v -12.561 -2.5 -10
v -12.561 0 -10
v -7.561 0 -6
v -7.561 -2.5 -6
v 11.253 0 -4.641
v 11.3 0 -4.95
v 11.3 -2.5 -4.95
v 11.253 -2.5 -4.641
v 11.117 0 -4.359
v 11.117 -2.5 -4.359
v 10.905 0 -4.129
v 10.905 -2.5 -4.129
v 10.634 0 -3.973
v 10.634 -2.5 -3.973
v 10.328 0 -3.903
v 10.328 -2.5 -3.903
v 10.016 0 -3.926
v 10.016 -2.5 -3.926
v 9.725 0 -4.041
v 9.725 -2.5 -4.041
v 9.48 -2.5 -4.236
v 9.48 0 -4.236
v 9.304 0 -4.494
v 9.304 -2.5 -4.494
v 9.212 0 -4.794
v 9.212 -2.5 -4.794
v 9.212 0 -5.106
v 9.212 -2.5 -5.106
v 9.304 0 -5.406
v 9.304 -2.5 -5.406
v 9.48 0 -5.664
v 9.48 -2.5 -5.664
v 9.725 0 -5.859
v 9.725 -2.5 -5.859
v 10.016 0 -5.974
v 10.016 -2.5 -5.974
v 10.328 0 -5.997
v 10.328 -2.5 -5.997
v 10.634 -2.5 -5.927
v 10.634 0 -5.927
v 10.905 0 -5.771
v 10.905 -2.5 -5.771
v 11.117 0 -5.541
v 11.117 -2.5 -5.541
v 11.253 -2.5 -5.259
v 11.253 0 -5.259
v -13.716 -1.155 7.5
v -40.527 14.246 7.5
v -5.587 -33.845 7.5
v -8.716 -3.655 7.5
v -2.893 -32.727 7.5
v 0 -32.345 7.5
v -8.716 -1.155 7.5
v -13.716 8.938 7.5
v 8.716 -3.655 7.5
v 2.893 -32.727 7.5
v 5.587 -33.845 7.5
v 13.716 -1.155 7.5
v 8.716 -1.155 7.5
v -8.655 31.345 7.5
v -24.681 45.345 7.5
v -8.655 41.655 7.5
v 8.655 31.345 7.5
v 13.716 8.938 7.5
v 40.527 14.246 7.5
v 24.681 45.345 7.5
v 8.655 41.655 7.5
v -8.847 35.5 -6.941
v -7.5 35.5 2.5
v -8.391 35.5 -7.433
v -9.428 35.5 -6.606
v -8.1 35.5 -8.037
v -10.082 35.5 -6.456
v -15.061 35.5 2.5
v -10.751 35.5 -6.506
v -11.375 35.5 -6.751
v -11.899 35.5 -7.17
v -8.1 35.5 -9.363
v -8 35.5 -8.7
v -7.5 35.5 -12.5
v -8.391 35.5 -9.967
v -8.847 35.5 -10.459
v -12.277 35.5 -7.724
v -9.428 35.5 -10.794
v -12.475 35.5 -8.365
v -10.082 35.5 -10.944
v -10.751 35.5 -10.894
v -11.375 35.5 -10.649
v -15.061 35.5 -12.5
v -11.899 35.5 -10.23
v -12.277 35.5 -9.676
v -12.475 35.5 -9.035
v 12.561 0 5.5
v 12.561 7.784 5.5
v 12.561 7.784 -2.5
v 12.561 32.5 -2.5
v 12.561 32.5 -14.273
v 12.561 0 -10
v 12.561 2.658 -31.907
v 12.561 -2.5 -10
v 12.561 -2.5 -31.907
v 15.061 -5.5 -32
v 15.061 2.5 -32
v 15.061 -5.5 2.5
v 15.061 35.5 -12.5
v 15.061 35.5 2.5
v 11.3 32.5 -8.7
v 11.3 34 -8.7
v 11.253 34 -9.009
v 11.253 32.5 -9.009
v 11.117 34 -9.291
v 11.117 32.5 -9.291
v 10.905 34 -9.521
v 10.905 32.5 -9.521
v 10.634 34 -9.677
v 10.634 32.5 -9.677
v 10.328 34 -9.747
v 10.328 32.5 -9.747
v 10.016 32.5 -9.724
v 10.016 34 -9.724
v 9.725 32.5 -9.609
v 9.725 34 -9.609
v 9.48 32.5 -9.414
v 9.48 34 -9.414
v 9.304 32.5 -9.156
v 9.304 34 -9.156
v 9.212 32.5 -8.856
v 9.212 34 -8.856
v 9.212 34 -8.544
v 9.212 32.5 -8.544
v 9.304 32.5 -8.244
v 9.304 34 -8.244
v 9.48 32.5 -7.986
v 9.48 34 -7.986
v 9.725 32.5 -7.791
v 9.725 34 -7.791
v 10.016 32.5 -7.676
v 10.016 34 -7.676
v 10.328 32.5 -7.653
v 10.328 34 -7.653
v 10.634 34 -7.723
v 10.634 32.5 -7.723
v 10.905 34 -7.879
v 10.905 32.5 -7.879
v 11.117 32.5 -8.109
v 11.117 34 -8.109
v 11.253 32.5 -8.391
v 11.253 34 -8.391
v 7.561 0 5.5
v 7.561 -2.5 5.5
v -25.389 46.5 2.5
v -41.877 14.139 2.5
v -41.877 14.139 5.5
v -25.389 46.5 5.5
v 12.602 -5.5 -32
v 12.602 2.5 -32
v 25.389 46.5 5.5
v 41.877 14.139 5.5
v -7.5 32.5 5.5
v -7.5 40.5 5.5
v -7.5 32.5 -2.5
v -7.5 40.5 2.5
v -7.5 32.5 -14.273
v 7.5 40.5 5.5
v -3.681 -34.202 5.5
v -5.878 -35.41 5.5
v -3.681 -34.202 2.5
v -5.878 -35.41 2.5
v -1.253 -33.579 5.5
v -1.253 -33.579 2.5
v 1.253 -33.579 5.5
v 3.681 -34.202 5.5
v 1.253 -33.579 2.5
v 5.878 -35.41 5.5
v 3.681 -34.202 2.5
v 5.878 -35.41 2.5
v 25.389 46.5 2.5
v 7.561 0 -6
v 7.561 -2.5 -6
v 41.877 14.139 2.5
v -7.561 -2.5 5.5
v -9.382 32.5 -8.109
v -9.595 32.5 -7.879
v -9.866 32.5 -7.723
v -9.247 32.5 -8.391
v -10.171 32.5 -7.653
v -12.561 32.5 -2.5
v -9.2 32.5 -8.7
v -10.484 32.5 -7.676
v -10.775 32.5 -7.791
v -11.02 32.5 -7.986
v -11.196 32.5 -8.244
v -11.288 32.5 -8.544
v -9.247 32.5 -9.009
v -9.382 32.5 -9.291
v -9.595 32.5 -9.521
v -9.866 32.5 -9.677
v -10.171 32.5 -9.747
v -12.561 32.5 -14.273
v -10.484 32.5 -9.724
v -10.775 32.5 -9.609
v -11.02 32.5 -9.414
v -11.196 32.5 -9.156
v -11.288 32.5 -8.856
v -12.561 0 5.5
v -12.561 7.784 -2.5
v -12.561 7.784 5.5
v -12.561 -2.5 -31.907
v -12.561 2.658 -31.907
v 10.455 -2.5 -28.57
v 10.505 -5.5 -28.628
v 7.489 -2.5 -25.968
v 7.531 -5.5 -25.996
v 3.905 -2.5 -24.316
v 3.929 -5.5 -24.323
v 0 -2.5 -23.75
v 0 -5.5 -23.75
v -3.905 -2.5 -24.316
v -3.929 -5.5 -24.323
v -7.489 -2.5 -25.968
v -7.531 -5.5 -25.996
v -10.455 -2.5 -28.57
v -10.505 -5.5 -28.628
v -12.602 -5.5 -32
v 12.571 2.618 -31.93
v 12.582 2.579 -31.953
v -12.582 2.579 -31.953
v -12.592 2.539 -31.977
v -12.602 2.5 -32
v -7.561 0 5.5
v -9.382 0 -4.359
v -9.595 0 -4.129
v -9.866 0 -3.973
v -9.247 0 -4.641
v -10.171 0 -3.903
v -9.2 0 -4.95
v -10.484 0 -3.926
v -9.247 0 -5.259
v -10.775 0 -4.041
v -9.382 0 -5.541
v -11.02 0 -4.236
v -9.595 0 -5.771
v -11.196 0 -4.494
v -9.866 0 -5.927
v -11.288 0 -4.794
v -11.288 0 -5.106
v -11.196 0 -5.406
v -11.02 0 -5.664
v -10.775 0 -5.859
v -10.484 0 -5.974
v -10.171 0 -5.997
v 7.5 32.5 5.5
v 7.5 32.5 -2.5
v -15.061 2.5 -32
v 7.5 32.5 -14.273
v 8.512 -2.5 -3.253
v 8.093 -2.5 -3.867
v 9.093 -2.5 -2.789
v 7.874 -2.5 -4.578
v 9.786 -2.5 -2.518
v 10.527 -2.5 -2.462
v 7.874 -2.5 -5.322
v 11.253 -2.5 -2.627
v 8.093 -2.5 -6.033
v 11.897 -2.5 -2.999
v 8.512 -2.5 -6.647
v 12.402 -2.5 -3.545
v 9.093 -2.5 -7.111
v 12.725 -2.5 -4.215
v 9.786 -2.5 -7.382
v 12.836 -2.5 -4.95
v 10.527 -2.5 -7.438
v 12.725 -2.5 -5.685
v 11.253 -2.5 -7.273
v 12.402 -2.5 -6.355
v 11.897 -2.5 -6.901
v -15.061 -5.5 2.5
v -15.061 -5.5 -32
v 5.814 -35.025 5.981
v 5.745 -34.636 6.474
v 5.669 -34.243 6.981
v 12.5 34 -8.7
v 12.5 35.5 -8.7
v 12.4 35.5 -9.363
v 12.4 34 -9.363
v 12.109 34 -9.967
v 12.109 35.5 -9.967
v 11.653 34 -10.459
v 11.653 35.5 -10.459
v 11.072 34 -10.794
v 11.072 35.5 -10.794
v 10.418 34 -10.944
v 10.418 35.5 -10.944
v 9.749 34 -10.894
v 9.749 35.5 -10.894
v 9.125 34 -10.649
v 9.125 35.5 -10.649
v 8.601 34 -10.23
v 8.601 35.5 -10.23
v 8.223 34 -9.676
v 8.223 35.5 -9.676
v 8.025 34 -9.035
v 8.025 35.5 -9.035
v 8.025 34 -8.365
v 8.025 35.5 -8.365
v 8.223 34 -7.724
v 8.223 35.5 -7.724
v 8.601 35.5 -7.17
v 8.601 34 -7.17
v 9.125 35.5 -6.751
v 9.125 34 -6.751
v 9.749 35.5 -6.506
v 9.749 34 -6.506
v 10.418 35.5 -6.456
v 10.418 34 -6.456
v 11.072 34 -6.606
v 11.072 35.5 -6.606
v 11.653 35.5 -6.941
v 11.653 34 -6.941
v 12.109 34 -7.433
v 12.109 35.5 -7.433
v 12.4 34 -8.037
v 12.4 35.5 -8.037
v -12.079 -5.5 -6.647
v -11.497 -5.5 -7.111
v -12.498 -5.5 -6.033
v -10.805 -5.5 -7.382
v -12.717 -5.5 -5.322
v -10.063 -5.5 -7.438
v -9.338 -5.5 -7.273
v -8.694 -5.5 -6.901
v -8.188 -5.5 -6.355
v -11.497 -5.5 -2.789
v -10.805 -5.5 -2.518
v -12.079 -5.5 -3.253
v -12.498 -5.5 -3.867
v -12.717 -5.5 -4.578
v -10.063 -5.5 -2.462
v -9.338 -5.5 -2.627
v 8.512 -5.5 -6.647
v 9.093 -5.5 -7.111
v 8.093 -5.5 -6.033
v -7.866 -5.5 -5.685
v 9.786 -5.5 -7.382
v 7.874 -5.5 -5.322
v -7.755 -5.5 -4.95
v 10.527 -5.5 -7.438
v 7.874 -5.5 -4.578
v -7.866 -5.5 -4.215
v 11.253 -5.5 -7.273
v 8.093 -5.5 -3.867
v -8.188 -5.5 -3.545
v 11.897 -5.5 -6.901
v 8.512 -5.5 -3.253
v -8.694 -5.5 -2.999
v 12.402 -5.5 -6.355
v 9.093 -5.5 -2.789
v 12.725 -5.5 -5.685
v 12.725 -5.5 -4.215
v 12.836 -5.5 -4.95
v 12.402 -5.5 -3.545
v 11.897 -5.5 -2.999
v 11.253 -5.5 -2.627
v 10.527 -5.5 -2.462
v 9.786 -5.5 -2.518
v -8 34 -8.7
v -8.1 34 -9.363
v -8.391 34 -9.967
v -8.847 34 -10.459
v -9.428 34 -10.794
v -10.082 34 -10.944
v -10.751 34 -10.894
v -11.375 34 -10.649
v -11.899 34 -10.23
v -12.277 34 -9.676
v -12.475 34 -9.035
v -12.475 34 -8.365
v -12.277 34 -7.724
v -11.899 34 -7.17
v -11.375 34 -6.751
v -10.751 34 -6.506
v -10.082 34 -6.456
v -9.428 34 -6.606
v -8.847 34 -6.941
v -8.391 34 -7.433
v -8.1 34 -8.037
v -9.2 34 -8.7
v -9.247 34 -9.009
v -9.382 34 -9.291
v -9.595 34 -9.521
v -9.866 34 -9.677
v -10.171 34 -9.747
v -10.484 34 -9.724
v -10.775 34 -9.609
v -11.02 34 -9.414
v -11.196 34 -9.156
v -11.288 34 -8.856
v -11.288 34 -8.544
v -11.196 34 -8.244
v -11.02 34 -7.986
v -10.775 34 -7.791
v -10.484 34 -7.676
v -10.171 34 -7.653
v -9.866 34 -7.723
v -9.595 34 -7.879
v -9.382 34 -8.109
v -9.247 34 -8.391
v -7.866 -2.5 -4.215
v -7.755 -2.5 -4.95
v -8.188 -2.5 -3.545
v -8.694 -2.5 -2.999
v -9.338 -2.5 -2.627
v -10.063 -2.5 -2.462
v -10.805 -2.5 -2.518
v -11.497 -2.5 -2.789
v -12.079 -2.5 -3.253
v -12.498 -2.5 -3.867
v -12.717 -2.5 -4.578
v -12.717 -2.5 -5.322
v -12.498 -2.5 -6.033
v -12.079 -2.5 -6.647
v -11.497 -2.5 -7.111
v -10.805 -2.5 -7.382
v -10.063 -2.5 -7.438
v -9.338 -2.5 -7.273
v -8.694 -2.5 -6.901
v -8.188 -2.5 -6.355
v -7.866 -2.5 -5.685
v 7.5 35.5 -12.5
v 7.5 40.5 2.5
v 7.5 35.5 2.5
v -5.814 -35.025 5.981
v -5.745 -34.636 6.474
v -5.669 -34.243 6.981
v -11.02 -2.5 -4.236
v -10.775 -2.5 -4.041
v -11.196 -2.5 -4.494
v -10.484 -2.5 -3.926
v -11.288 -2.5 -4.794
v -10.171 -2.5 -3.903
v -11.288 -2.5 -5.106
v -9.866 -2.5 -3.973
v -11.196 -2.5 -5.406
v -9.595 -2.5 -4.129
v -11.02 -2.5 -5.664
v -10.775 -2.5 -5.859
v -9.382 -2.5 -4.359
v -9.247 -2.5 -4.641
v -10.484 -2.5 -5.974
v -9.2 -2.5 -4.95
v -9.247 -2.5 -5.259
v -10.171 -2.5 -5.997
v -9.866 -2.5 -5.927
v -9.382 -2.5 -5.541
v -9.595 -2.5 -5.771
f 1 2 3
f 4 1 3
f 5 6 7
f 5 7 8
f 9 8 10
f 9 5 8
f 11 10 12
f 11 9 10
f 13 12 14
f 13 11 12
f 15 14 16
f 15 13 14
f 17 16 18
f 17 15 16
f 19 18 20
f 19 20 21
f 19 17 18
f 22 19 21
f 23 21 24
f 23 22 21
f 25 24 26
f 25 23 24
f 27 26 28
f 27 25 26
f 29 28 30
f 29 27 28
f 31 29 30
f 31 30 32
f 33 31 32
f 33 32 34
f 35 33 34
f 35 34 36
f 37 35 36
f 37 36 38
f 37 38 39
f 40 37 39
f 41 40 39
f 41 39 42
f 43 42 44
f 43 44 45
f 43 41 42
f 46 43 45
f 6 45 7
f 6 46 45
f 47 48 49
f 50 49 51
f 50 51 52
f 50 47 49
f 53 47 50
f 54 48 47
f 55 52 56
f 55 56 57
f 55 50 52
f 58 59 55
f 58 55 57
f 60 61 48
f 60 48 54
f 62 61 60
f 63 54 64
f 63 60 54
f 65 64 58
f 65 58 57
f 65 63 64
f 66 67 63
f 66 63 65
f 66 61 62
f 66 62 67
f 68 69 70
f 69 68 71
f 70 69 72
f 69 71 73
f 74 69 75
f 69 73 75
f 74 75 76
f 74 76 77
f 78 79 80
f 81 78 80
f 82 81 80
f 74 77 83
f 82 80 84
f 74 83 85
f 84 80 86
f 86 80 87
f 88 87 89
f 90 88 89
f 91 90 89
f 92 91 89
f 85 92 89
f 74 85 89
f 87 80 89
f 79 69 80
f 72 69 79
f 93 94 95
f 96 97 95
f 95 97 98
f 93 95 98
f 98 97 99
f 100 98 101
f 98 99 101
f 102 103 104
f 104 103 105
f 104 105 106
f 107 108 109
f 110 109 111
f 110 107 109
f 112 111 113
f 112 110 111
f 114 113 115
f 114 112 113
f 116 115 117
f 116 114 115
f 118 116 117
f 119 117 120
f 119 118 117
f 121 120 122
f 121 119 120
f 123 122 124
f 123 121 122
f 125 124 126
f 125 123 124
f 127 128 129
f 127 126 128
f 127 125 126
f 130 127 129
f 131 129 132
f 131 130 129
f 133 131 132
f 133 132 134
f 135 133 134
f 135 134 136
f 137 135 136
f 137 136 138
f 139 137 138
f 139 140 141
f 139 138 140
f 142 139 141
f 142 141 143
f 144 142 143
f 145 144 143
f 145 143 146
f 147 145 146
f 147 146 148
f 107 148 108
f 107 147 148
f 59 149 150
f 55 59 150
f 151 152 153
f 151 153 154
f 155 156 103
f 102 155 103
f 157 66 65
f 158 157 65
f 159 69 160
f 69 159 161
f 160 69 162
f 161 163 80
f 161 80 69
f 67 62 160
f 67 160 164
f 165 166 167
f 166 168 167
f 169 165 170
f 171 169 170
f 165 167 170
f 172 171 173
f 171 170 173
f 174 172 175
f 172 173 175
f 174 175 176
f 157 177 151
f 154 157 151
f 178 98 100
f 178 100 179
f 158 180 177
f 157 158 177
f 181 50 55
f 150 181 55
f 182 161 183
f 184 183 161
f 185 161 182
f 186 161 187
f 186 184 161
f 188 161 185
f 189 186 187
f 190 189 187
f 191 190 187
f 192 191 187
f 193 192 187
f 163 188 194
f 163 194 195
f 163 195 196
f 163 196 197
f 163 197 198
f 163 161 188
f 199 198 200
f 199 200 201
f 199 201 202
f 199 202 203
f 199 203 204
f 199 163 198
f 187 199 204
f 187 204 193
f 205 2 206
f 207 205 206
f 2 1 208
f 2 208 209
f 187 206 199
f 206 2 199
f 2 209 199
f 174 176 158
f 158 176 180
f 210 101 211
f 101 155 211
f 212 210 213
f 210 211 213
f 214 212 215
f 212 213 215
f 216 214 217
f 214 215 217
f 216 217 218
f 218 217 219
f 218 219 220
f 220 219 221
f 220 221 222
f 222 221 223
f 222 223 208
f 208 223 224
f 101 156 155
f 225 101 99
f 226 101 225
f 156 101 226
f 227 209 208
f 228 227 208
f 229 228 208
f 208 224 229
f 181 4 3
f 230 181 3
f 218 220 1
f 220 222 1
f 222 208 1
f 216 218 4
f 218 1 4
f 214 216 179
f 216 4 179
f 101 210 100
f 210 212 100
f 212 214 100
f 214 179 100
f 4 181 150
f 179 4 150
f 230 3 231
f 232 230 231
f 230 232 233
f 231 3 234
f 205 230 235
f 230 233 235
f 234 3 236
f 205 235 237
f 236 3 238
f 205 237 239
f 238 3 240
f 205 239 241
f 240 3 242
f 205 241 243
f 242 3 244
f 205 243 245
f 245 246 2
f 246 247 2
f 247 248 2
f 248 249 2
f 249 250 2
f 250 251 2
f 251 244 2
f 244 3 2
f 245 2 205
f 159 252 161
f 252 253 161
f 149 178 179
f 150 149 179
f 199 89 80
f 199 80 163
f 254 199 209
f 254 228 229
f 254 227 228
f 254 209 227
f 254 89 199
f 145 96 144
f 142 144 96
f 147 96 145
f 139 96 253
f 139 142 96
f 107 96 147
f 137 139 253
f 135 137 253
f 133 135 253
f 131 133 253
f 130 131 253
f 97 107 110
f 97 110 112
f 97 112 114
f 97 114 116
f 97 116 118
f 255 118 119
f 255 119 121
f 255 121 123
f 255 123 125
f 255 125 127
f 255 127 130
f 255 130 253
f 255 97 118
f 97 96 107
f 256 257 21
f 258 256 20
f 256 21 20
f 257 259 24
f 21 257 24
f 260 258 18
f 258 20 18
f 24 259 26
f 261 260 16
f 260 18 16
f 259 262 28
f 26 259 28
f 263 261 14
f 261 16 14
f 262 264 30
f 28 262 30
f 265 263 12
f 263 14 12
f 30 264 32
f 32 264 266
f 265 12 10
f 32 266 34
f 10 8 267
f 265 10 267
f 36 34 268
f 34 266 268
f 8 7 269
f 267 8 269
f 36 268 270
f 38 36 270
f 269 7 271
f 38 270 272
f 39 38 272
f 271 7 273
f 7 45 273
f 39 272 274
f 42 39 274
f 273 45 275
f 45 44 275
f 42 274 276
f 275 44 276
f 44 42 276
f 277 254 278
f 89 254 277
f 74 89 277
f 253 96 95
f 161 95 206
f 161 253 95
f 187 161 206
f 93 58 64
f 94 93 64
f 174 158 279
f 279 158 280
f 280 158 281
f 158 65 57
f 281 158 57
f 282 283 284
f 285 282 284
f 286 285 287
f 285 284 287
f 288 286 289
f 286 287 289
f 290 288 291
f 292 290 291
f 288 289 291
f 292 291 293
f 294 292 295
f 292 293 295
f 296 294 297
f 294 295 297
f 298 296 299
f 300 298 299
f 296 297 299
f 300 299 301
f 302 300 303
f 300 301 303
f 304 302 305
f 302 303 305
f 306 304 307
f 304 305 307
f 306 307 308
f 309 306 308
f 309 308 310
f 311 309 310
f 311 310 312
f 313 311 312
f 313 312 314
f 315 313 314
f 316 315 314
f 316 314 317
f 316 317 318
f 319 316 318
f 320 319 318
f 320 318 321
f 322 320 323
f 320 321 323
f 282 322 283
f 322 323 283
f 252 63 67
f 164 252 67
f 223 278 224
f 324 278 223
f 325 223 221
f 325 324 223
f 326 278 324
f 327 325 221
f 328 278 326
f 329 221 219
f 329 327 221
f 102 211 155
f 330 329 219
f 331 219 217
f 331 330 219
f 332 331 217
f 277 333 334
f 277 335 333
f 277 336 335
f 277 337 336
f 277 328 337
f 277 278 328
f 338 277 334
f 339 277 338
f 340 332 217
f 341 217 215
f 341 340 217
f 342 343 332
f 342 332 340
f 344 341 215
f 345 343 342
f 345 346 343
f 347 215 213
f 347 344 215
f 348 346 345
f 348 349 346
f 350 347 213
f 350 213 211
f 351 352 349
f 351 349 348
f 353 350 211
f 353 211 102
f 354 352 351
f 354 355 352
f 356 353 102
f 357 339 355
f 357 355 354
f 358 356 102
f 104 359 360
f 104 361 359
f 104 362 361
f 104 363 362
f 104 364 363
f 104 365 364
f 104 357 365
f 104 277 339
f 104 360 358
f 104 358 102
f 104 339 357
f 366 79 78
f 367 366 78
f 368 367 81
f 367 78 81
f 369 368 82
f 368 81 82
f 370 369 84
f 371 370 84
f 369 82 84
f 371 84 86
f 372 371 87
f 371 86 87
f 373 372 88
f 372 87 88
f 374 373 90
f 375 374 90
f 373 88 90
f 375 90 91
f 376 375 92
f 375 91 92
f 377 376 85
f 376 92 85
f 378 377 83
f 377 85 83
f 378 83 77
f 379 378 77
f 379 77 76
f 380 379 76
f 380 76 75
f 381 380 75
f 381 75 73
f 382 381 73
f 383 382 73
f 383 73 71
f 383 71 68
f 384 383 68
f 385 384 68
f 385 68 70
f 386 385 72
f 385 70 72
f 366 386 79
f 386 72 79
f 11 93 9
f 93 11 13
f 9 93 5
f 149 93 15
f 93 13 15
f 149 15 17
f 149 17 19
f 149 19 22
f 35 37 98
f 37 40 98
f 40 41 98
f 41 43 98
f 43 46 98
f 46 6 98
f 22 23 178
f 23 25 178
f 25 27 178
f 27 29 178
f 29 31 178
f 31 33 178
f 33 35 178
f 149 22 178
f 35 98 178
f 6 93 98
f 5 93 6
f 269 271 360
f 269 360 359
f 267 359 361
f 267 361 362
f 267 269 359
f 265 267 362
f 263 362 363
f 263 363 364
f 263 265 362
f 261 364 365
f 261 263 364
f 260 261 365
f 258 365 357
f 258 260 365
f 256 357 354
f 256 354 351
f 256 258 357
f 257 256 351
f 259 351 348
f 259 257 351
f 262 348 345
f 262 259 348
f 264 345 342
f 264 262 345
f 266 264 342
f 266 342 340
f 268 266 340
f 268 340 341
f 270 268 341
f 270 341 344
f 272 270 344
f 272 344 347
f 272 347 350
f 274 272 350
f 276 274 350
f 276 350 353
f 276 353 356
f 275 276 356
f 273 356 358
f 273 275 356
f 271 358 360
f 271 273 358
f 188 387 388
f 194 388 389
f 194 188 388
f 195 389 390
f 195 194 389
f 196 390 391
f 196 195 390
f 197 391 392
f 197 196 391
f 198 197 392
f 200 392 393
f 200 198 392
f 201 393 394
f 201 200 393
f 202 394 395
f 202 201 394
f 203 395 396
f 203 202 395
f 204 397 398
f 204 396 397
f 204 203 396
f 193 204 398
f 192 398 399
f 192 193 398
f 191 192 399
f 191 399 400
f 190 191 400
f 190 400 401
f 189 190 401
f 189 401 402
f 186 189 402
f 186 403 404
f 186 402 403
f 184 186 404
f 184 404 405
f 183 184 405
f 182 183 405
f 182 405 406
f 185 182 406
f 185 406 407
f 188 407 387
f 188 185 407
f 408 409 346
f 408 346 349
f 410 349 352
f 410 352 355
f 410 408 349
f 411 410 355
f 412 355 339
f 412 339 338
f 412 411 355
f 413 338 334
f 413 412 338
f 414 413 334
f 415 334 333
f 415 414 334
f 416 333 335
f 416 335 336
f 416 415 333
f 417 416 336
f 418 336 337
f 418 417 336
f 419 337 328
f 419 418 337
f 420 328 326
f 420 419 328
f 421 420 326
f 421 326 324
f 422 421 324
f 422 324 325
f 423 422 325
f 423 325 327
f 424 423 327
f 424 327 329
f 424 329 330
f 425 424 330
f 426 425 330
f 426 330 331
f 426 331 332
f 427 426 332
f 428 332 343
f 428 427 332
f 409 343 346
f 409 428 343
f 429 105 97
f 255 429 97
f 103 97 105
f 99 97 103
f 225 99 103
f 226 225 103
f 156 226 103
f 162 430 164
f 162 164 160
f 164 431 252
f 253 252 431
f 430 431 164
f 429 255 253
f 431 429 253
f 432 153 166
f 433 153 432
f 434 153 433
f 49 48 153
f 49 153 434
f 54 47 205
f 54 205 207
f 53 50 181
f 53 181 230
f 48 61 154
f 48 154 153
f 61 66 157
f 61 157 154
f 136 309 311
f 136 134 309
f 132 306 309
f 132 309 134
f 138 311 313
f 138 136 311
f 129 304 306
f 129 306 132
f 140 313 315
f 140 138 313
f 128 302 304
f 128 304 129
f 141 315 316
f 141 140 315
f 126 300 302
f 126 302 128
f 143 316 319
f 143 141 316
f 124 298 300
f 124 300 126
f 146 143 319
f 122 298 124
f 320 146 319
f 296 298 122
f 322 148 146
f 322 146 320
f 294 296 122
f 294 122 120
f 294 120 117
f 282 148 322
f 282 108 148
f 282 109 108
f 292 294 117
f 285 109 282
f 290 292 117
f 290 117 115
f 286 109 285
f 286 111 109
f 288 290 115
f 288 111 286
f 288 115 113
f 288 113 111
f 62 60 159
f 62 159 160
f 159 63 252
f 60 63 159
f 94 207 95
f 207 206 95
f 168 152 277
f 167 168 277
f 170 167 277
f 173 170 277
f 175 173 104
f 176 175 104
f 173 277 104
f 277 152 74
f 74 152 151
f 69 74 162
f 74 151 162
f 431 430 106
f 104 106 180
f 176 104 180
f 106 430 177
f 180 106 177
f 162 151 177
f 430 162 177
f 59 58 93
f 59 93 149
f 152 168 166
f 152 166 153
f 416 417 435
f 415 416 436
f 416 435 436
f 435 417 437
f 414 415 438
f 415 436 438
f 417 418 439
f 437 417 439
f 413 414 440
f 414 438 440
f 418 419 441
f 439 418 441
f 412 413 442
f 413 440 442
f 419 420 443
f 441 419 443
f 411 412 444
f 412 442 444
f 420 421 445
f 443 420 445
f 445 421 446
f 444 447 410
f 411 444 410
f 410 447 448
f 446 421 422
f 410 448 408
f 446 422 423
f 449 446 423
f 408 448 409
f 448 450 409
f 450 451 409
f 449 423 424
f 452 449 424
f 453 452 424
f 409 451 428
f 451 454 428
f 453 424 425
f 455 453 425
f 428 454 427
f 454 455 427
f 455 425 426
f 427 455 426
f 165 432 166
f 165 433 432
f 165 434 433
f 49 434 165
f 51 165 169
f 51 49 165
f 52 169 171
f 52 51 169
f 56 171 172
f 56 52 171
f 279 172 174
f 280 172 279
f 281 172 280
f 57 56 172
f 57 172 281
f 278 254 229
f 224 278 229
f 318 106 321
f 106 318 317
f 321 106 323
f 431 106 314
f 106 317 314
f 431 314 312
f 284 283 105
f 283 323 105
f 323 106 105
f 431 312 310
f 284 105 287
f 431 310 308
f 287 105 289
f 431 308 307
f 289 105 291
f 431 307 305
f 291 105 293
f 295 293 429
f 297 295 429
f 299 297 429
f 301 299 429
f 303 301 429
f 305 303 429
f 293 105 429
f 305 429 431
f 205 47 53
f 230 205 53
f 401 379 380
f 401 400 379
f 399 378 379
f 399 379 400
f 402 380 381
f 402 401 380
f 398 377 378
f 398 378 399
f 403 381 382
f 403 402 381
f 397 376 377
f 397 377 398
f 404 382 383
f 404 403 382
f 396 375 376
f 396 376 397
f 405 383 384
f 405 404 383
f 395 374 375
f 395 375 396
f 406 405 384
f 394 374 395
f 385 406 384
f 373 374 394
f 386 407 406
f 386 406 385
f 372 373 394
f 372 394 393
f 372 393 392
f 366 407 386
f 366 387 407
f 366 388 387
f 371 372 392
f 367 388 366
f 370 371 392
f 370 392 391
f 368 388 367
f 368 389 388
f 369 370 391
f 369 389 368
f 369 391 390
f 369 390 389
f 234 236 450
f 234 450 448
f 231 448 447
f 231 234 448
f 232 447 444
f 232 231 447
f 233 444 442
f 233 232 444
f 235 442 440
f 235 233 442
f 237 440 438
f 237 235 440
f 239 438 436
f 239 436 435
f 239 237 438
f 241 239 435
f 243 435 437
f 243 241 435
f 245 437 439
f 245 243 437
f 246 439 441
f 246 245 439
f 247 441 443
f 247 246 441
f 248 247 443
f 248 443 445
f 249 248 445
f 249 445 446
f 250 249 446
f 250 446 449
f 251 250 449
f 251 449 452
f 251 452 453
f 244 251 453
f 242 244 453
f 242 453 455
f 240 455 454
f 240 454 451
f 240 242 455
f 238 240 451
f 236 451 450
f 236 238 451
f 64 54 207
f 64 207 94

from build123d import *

# Parameters (mm, degrees)
BOSS_EXTRUDE1_DEPTH     = 32.5
SKETCH4_R               = 1.05
BOSS_EXTRUDE2_DEPTH     = 2.5
SKETCH5_R               = 1.05
BOSS_EXTRUDE3_DEPTH     = 3
CUT_EXTRUDE1_DEPTH      = 31.122
SKETCH13_W              = 30.122
SKETCH13_H              = 38
BOSS_EXTRUDE7_DEPTH     = 2.5
BOSS_EXTRUDE4_DEPTH     = 5
BOSS_EXTRUDE6_DEPTH     = 5
CUT_EXTRUDE2_DEPTH      = 6
SKETCH14_W              = 15
SKETCH14_H              = 5
CUT_EXTRUDE3_DEPTH      = 11
SKETCH15_W              = 30.122
SKETCH15_H              = 34.5
SKETCH15_R              = 2.495
BOSS_EXTRUDE8_DEPTH     = 3
SKETCH17_R              = 13.75
CUT_EXTRUDE4_DEPTH      = 53
SKETCH19_W              = 15
SKETCH19_H              = 3
CUT_EXTRUDE6_DEPTH      = 30.5
CUT_EXTRUDE6_DEPTH_BACK = 11
SKETCH21_R              = 2.25
CUT_EXTRUDE8_DEPTH      = 1.5
SKETCH20_R              = 10
CUT_EXTRUDE7_DEPTH      = 6
CHAMFER1_SIZE           = 2
CHAMFER1_SIZE2          = 1.154700538
CHAMFER1_PART_2_SIZE    = 2
CHAMFER1_PART_2_SIZE2   = 1.154700538
CHAMFER1_PART_3_SIZE    = 2
CHAMFER1_PART_3_SIZE2   = 1.154700538
CHAMFER1_PART_4_SIZE    = 2
CHAMFER1_PART_4_SIZE2   = 1.154700538
CHAMFER1_PART_5_SIZE    = 2
CHAMFER1_PART_5_SIZE2   = 1.154700538
CHAMFER1_PART_6_SIZE    = 2
CHAMFER1_PART_6_SIZE2   = 1.154700538
CHAMFER1_PART_7_SIZE    = 2
CHAMFER1_PART_7_SIZE2   = 1.154700538
CHAMFER1_PART_8_SIZE    = 2
CHAMFER1_PART_8_SIZE2   = 1.154700538
CHAMFER1_PART_9_SIZE    = 2
CHAMFER1_PART_9_SIZE2   = 1.154700538
CHAMFER1_PART_10_SIZE   = 2
CHAMFER1_PART_10_SIZE2  = 1.154700538
CHAMFER1_PART_11_SIZE   = 2
CHAMFER1_PART_11_SIZE2  = 1.154700538
CHAMFER1_PART_12_SIZE   = 2
CHAMFER1_PART_12_SIZE2  = 1.154700538
CHAMFER1_PART_13_SIZE   = 2
CHAMFER1_PART_13_SIZE2  = 1.154700538
CHAMFER1_PART_14_SIZE   = 2
CHAMFER1_PART_14_SIZE2  = 1.154700538
CHAMFER1_PART_15_SIZE   = 2
CHAMFER1_PART_15_SIZE2  = 1.154700538
CHAMFER1_PART_16_SIZE   = 2
CHAMFER1_PART_16_SIZE2  = 1.154700538
CHAMFER1_PART_17_SIZE   = 2
CHAMFER1_PART_17_SIZE2  = 1.154700538
CHAMFER1_PART_18_SIZE   = 2
CHAMFER1_PART_18_SIZE2  = 1.154700538


with BuildPart() as part:
    # Sketch2 → Boss-Extrude1 (new body)
    with BuildSketch(Plane(origin=(0, 0, 0), x_dir=(1, 0, 0), z_dir=(0, 1, 0))):
        Polygon((15.061, 0), (15.061, 32), (12.561, 32), (12.561, 2.5), (-12.561, 2.5), (-12.561, 32), (-15.061, 32), (-15.061, 0), align=None)
    extrude(amount=BOSS_EXTRUDE1_DEPTH)

    # Sketch4 → Boss-Extrude2 (add)
    with BuildSketch(Plane.XZ):
        Polygon((-7.561, -6), (-7.561, 0), (-15.061, 0), (-15.061, -32), (-12.561, -32), (-12.561, -10), align=None)
        with Locations((-10.2499, -4.95)):
            Circle(SKETCH4_R, mode=Mode.SUBTRACT)
        Polygon((12.561, -10), (7.561, -6), (7.561, 0), (15.061, 0), (15.061, -32), (12.561, -32), align=None)
        with Locations((10.2499, -4.95)):
            Circle(SKETCH4_R, mode=Mode.SUBTRACT)
    extrude(amount=BOSS_EXTRUDE2_DEPTH)

    # Sketch5 → Boss-Extrude3 (add)
    with BuildSketch(Plane(origin=(0, 32.5, 0), x_dir=(1, 0, 0), z_dir=(0, 1, 0))):
        Polygon((-15.061, 32), (-10.2499, 32), (-6.25, 26), (6.25, 26), (10.2499, 32), (15.061, 32), (15.061, 0), (-15.061, 0), align=None)
        with Locations((-10.2499, 8.7)):
            Circle(SKETCH5_R, mode=Mode.SUBTRACT)
        with Locations((10.2499, 8.7)):
            Circle(SKETCH5_R, mode=Mode.SUBTRACT)
    extrude(amount=BOSS_EXTRUDE3_DEPTH)

    # Sketch6 → Cut-Extrude1 (cut, through all)
    with BuildSketch(Plane.ZY.offset(15.061)):
        Polygon((-12.5, 35.5), (-32, 2.5), (-32, 35.5), align=None)
    extrude(amount=-CUT_EXTRUDE1_DEPTH, mode=Mode.SUBTRACT)

    # Sketch13 → Boss-Extrude7 (add)
    with BuildSketch(Plane.XY):
        with Locations((0, 16.5)):
            Rectangle(SKETCH13_W, SKETCH13_H)
    extrude(amount=BOSS_EXTRUDE7_DEPTH)

    # Sketch8 → Boss-Extrude4 (add)
    with BuildSketch(Plane.XY.offset(2.5)):
        Polygon((0, -43.5), (-43.59255168, 16.5), (43.59255168, 16.5), align=None)
    extrude(amount=BOSS_EXTRUDE4_DEPTH)

    # Sketch9 → Boss-Extrude6 (add)
    with BuildSketch(Plane.XY.offset(2.5)):
        Polygon((43.59255168, 16.5), (65.38882752, 46.5), (-65.38882752, 46.5), (-43.59255168, 16.5), align=None)
    extrude(amount=BOSS_EXTRUDE6_DEPTH)

    # Sketch10 → Cut-Extrude2 (cut, through all)
    with BuildSketch(Plane(origin=(0, 0, 2.5), x_dir=(-1, 0, 0), z_dir=(0, 0, -1))):
        Polygon((-25.38882752, 46.5), (-65.38882752, 46.5), (-41.877417429, 14.139320225), align=None)
        Polygon((65.38882752, 46.5), (41.877417429, 14.139320225), (25.38882752, 46.5), align=None)
    extrude(amount=-CUT_EXTRUDE2_DEPTH, mode=Mode.SUBTRACT)

    # Sketch14 → Cut-Extrude3 (cut, through all)
    with BuildSketch(Plane(origin=(0, 0, -2.5), x_dir=(-1, 0, 0), z_dir=(0, 0, -1))):
        Polygon((-7.561, -2.5), (7.561, -2.5), (7.561, 0), (12.561, 0), (12.561, 7.783674653), (-12.561, 7.783674653), (-12.561, 0), (-7.561, 0), align=None)
        with Locations((0, 38)):
            Rectangle(SKETCH14_W, SKETCH14_H)
    extrude(amount=-CUT_EXTRUDE3_DEPTH, mode=Mode.SUBTRACT)

    # Sketch15 → Boss-Extrude8 (add)
    with BuildSketch(Plane.XZ.offset(2.5)):
        with Locations((0, -14.75)):
            Rectangle(SKETCH15_W, SKETCH15_H)
        with Locations((-10.2499, -4.95)):
            Circle(SKETCH15_R, mode=Mode.SUBTRACT)
        with Locations((10.340989886, -4.95)):
            Circle(SKETCH15_R, mode=Mode.SUBTRACT)
    extrude(amount=BOSS_EXTRUDE8_DEPTH)

    # Sketch17 → Cut-Extrude4 (cut, through all)
    with BuildSketch(Plane.XZ.offset(5.5)):
        with Locations((0, -37.5)):
            Circle(SKETCH17_R)
    extrude(amount=-CUT_EXTRUDE4_DEPTH, mode=Mode.SUBTRACT)

    # Sketch19 → Cut-Extrude6 (cut, two sides)
    with BuildSketch(Plane(origin=(0, 0, -2.5), x_dir=(-1, 0, 0), z_dir=(0, 0, -1))) as cut_extrude6_sk:
        with Locations((0, 34)):
            Rectangle(SKETCH19_W, SKETCH19_H)
    extrude(amount=CUT_EXTRUDE6_DEPTH, mode=Mode.SUBTRACT)
    extrude(cut_extrude6_sk.sketch, amount=-CUT_EXTRUDE6_DEPTH_BACK, mode=Mode.SUBTRACT)

    # Sketch21 → Cut-Extrude8 (cut)
    with BuildSketch(Plane(origin=(0, 35.5, 0), x_dir=(1, 0, 0), z_dir=(0, 1, 0))):
        with Locations((-10.2499, 8.7)):
            Circle(SKETCH21_R)
        with Locations((10.2499, 8.7)):
            Circle(SKETCH21_R)
    extrude(amount=-CUT_EXTRUDE8_DEPTH, mode=Mode.SUBTRACT)

    # Sketch20 → Cut-Extrude7 (cut, through all)
    with BuildSketch(Plane(origin=(0, 0, 2.5), x_dir=(-1, 0, 0), z_dir=(0, 0, -1))):
        with Locations((0, -43.5)):
            Circle(SKETCH20_R)
    extrude(amount=-CUT_EXTRUDE7_DEPTH, mode=Mode.SUBTRACT)

    # Chamfer1
    chamfer1_edges = [part.edges().sort_by_distance(p)[0] for p in [
        (-23.877634976, -10.635254916, 7.5),
    ]]
    chamfer1_side = [part.faces().sort_by_distance(p)[0] for p in [
        (-23.877634976, -10.635254916, 5),
    ]]
    chamfer(chamfer1_edges, length=CHAMFER1_SIZE, length2=CHAMFER1_SIZE2, reference=chamfer1_side[0])

    # Chamfer1 part 2
    chamfer1_part_2_edges = [part.edges().sort_by_distance(p)[0] for p in [
        (-33.633122475, 30.319660113, 7.5),
    ]]
    chamfer1_part_2_side = [part.faces().sort_by_distance(p)[0] for p in [
        (-33.633122475, 30.319660113, 5),
    ]]
    chamfer(chamfer1_part_2_edges, length=CHAMFER1_PART_2_SIZE, length2=CHAMFER1_PART_2_SIZE2, reference=chamfer1_part_2_side[0])

    # Chamfer1 part 3
    chamfer1_part_3_edges = [part.edges().sort_by_distance(p)[0] for p in [
        (0, 46.5, 7.5),
    ]]
    chamfer1_part_3_side = [part.faces().sort_by_distance(p)[0] for p in [
        (0, 46.5, 5),
    ]]
    chamfer(chamfer1_part_3_edges, length=CHAMFER1_PART_3_SIZE, length2=CHAMFER1_PART_3_SIZE2, reference=chamfer1_part_3_side[0])

    # Chamfer1 part 4
    chamfer1_part_4_edges = [part.edges().sort_by_distance(p)[0] for p in [
        (33.633122475, 30.319660113, 7.5),
    ]]
    chamfer1_part_4_side = [part.faces().sort_by_distance(p)[0] for p in [
        (33.633122475, 30.319660113, 5),
    ]]
    chamfer(chamfer1_part_4_edges, length=CHAMFER1_PART_4_SIZE, length2=CHAMFER1_PART_4_SIZE2, reference=chamfer1_part_4_side[0])

    # Chamfer1 part 5
    chamfer1_part_5_edges = [part.edges().sort_by_distance(p)[0] for p in [
        (23.877634976, -10.635254916, 7.5),
    ]]
    chamfer1_part_5_side = [part.faces().sort_by_distance(p)[0] for p in [
        (23.877634976, -10.635254916, 5),
    ]]
    chamfer(chamfer1_part_5_edges, length=CHAMFER1_PART_5_SIZE, length2=CHAMFER1_PART_5_SIZE2, reference=chamfer1_part_5_side[0])

    # Chamfer1 part 6
    chamfer1_part_6_edges = [part.edges().sort_by_distance(p)[0] for p in [
        (0, -33.5, 7.5),
    ]]
    chamfer1_part_6_side = [part.faces().sort_by_distance(p)[0] for p in [
        (0, -33.5, 5),
    ]]
    chamfer(chamfer1_part_6_edges, length=CHAMFER1_PART_6_SIZE, length2=CHAMFER1_PART_6_SIZE2, reference=chamfer1_part_6_side[0])

    # Chamfer1 part 7
    chamfer1_part_7_edges = [part.edges().sort_by_distance(p)[0] for p in [
        (7.5, 36.5, 7.5),
    ]]
    chamfer1_part_7_side = [part.faces().sort_by_distance(p)[0] for p in [
        (7.5, 35.125615764, -0.682301365),
    ]]
    chamfer(chamfer1_part_7_edges, length=CHAMFER1_PART_7_SIZE, length2=CHAMFER1_PART_7_SIZE2, reference=chamfer1_part_7_side[0])

    # Chamfer1 part 8
    chamfer1_part_8_edges = [part.edges().sort_by_distance(p)[0] for p in [
        (0, 40.5, 7.5),
    ]]
    chamfer1_part_8_side = [part.faces().sort_by_distance(p)[0] for p in [
        (0, 40.5, 5),
    ]]
    chamfer(chamfer1_part_8_edges, length=CHAMFER1_PART_8_SIZE, length2=CHAMFER1_PART_8_SIZE2, reference=chamfer1_part_8_side[0])

    # Chamfer1 part 9
    chamfer1_part_9_edges = [part.edges().sort_by_distance(p)[0] for p in [
        (-7.5, 36.5, 7.5),
    ]]
    chamfer1_part_9_side = [part.faces().sort_by_distance(p)[0] for p in [
        (-7.5, 35.125615764, -0.682301365),
    ]]
    chamfer(chamfer1_part_9_edges, length=CHAMFER1_PART_9_SIZE, length2=CHAMFER1_PART_9_SIZE2, reference=chamfer1_part_9_side[0])

    # Chamfer1 part 10
    chamfer1_part_10_edges = [part.edges().sort_by_distance(p)[0] for p in [
        (12.561, 3.891837327, 7.5),
    ]]
    chamfer1_part_10_side = [part.faces().sort_by_distance(p)[0] for p in [
        (12.561, 11.913281954, -12.779758376),
    ]]
    chamfer(chamfer1_part_10_edges, length=CHAMFER1_PART_10_SIZE, length2=CHAMFER1_PART_10_SIZE2, reference=chamfer1_part_10_side[0])

    # Chamfer1 part 11
    chamfer1_part_11_edges = [part.edges().sort_by_distance(p)[0] for p in [
        (0, -2.5, 7.5),
    ]]
    chamfer1_part_11_side = [part.faces().sort_by_distance(p)[0] for p in [
        (0, -2.5, -11.382409491),
    ]]
    chamfer(chamfer1_part_11_edges, length=CHAMFER1_PART_11_SIZE, length2=CHAMFER1_PART_11_SIZE2, reference=chamfer1_part_11_side[0])

    # Chamfer1 part 12
    chamfer1_part_12_edges = [part.edges().sort_by_distance(p)[0] for p in [
        (-7.561, -1.25, 7.5),
    ]]
    chamfer1_part_12_side = [part.faces().sort_by_distance(p)[0] for p in [
        (-7.561, -1.25, 0.75),
    ]]
    chamfer(chamfer1_part_12_edges, length=CHAMFER1_PART_12_SIZE, length2=CHAMFER1_PART_12_SIZE2, reference=chamfer1_part_12_side[0])

    # Chamfer1 part 13
    chamfer1_part_13_edges = [part.edges().sort_by_distance(p)[0] for p in [
        (7.561, -1.25, 7.5),
    ]]
    chamfer1_part_13_side = [part.faces().sort_by_distance(p)[0] for p in [
        (7.561, -1.25, 0.75),
    ]]
    chamfer(chamfer1_part_13_edges, length=CHAMFER1_PART_13_SIZE, length2=CHAMFER1_PART_13_SIZE2, reference=chamfer1_part_13_side[0])

    # Chamfer1 part 14
    chamfer1_part_14_edges = [part.edges().sort_by_distance(p)[0] for p in [
        (-10.061, 0, 7.5),
    ]]
    chamfer1_part_14_side = [part.faces().sort_by_distance(p)[0] for p in [
        (-10.164720046, 0, -0.075145261),
    ]]
    chamfer(chamfer1_part_14_edges, length=CHAMFER1_PART_14_SIZE, length2=CHAMFER1_PART_14_SIZE2, reference=chamfer1_part_14_side[0])

    # Chamfer1 part 15
    chamfer1_part_15_edges = [part.edges().sort_by_distance(p)[0] for p in [
        (10.061, 0, 7.5),
    ]]
    chamfer1_part_15_side = [part.faces().sort_by_distance(p)[0] for p in [
        (10.164720046, 0, -0.075145261),
    ]]
    chamfer(chamfer1_part_15_edges, length=CHAMFER1_PART_15_SIZE, length2=CHAMFER1_PART_15_SIZE2, reference=chamfer1_part_15_side[0])

    # Chamfer1 part 16
    chamfer1_part_16_edges = [part.edges().sort_by_distance(p)[0] for p in [
        (-12.561, 3.891837327, 7.5),
    ]]
    chamfer1_part_16_side = [part.faces().sort_by_distance(p)[0] for p in [
        (-12.561, 11.913281954, -12.779758376),
    ]]
    chamfer(chamfer1_part_16_edges, length=CHAMFER1_PART_16_SIZE, length2=CHAMFER1_PART_16_SIZE2, reference=chamfer1_part_16_side[0])

    # Chamfer1 part 17
    chamfer1_part_17_edges = [part.edges().sort_by_distance(p)[0] for p in [
        (0, 7.783674653, 7.5),
    ]]
    chamfer1_part_17_side = [part.faces().sort_by_distance(p)[0] for p in [
        (0, 7.783674653, 2.5),
    ]]
    chamfer(chamfer1_part_17_edges, length=CHAMFER1_PART_17_SIZE, length2=CHAMFER1_PART_17_SIZE2, reference=chamfer1_part_17_side[0])

    # Chamfer1 part 18
    chamfer1_part_18_edges = [part.edges().sort_by_distance(p)[0] for p in [
        (0, 32.5, 7.5),
    ]]
    chamfer1_part_18_side = [part.faces().sort_by_distance(p)[0] for p in [
        (0, 32.5, 2.5),
    ]]
    chamfer(chamfer1_part_18_edges, length=CHAMFER1_PART_18_SIZE, length2=CHAMFER1_PART_18_SIZE2, reference=chamfer1_part_18_side[0])


solid = part.part
